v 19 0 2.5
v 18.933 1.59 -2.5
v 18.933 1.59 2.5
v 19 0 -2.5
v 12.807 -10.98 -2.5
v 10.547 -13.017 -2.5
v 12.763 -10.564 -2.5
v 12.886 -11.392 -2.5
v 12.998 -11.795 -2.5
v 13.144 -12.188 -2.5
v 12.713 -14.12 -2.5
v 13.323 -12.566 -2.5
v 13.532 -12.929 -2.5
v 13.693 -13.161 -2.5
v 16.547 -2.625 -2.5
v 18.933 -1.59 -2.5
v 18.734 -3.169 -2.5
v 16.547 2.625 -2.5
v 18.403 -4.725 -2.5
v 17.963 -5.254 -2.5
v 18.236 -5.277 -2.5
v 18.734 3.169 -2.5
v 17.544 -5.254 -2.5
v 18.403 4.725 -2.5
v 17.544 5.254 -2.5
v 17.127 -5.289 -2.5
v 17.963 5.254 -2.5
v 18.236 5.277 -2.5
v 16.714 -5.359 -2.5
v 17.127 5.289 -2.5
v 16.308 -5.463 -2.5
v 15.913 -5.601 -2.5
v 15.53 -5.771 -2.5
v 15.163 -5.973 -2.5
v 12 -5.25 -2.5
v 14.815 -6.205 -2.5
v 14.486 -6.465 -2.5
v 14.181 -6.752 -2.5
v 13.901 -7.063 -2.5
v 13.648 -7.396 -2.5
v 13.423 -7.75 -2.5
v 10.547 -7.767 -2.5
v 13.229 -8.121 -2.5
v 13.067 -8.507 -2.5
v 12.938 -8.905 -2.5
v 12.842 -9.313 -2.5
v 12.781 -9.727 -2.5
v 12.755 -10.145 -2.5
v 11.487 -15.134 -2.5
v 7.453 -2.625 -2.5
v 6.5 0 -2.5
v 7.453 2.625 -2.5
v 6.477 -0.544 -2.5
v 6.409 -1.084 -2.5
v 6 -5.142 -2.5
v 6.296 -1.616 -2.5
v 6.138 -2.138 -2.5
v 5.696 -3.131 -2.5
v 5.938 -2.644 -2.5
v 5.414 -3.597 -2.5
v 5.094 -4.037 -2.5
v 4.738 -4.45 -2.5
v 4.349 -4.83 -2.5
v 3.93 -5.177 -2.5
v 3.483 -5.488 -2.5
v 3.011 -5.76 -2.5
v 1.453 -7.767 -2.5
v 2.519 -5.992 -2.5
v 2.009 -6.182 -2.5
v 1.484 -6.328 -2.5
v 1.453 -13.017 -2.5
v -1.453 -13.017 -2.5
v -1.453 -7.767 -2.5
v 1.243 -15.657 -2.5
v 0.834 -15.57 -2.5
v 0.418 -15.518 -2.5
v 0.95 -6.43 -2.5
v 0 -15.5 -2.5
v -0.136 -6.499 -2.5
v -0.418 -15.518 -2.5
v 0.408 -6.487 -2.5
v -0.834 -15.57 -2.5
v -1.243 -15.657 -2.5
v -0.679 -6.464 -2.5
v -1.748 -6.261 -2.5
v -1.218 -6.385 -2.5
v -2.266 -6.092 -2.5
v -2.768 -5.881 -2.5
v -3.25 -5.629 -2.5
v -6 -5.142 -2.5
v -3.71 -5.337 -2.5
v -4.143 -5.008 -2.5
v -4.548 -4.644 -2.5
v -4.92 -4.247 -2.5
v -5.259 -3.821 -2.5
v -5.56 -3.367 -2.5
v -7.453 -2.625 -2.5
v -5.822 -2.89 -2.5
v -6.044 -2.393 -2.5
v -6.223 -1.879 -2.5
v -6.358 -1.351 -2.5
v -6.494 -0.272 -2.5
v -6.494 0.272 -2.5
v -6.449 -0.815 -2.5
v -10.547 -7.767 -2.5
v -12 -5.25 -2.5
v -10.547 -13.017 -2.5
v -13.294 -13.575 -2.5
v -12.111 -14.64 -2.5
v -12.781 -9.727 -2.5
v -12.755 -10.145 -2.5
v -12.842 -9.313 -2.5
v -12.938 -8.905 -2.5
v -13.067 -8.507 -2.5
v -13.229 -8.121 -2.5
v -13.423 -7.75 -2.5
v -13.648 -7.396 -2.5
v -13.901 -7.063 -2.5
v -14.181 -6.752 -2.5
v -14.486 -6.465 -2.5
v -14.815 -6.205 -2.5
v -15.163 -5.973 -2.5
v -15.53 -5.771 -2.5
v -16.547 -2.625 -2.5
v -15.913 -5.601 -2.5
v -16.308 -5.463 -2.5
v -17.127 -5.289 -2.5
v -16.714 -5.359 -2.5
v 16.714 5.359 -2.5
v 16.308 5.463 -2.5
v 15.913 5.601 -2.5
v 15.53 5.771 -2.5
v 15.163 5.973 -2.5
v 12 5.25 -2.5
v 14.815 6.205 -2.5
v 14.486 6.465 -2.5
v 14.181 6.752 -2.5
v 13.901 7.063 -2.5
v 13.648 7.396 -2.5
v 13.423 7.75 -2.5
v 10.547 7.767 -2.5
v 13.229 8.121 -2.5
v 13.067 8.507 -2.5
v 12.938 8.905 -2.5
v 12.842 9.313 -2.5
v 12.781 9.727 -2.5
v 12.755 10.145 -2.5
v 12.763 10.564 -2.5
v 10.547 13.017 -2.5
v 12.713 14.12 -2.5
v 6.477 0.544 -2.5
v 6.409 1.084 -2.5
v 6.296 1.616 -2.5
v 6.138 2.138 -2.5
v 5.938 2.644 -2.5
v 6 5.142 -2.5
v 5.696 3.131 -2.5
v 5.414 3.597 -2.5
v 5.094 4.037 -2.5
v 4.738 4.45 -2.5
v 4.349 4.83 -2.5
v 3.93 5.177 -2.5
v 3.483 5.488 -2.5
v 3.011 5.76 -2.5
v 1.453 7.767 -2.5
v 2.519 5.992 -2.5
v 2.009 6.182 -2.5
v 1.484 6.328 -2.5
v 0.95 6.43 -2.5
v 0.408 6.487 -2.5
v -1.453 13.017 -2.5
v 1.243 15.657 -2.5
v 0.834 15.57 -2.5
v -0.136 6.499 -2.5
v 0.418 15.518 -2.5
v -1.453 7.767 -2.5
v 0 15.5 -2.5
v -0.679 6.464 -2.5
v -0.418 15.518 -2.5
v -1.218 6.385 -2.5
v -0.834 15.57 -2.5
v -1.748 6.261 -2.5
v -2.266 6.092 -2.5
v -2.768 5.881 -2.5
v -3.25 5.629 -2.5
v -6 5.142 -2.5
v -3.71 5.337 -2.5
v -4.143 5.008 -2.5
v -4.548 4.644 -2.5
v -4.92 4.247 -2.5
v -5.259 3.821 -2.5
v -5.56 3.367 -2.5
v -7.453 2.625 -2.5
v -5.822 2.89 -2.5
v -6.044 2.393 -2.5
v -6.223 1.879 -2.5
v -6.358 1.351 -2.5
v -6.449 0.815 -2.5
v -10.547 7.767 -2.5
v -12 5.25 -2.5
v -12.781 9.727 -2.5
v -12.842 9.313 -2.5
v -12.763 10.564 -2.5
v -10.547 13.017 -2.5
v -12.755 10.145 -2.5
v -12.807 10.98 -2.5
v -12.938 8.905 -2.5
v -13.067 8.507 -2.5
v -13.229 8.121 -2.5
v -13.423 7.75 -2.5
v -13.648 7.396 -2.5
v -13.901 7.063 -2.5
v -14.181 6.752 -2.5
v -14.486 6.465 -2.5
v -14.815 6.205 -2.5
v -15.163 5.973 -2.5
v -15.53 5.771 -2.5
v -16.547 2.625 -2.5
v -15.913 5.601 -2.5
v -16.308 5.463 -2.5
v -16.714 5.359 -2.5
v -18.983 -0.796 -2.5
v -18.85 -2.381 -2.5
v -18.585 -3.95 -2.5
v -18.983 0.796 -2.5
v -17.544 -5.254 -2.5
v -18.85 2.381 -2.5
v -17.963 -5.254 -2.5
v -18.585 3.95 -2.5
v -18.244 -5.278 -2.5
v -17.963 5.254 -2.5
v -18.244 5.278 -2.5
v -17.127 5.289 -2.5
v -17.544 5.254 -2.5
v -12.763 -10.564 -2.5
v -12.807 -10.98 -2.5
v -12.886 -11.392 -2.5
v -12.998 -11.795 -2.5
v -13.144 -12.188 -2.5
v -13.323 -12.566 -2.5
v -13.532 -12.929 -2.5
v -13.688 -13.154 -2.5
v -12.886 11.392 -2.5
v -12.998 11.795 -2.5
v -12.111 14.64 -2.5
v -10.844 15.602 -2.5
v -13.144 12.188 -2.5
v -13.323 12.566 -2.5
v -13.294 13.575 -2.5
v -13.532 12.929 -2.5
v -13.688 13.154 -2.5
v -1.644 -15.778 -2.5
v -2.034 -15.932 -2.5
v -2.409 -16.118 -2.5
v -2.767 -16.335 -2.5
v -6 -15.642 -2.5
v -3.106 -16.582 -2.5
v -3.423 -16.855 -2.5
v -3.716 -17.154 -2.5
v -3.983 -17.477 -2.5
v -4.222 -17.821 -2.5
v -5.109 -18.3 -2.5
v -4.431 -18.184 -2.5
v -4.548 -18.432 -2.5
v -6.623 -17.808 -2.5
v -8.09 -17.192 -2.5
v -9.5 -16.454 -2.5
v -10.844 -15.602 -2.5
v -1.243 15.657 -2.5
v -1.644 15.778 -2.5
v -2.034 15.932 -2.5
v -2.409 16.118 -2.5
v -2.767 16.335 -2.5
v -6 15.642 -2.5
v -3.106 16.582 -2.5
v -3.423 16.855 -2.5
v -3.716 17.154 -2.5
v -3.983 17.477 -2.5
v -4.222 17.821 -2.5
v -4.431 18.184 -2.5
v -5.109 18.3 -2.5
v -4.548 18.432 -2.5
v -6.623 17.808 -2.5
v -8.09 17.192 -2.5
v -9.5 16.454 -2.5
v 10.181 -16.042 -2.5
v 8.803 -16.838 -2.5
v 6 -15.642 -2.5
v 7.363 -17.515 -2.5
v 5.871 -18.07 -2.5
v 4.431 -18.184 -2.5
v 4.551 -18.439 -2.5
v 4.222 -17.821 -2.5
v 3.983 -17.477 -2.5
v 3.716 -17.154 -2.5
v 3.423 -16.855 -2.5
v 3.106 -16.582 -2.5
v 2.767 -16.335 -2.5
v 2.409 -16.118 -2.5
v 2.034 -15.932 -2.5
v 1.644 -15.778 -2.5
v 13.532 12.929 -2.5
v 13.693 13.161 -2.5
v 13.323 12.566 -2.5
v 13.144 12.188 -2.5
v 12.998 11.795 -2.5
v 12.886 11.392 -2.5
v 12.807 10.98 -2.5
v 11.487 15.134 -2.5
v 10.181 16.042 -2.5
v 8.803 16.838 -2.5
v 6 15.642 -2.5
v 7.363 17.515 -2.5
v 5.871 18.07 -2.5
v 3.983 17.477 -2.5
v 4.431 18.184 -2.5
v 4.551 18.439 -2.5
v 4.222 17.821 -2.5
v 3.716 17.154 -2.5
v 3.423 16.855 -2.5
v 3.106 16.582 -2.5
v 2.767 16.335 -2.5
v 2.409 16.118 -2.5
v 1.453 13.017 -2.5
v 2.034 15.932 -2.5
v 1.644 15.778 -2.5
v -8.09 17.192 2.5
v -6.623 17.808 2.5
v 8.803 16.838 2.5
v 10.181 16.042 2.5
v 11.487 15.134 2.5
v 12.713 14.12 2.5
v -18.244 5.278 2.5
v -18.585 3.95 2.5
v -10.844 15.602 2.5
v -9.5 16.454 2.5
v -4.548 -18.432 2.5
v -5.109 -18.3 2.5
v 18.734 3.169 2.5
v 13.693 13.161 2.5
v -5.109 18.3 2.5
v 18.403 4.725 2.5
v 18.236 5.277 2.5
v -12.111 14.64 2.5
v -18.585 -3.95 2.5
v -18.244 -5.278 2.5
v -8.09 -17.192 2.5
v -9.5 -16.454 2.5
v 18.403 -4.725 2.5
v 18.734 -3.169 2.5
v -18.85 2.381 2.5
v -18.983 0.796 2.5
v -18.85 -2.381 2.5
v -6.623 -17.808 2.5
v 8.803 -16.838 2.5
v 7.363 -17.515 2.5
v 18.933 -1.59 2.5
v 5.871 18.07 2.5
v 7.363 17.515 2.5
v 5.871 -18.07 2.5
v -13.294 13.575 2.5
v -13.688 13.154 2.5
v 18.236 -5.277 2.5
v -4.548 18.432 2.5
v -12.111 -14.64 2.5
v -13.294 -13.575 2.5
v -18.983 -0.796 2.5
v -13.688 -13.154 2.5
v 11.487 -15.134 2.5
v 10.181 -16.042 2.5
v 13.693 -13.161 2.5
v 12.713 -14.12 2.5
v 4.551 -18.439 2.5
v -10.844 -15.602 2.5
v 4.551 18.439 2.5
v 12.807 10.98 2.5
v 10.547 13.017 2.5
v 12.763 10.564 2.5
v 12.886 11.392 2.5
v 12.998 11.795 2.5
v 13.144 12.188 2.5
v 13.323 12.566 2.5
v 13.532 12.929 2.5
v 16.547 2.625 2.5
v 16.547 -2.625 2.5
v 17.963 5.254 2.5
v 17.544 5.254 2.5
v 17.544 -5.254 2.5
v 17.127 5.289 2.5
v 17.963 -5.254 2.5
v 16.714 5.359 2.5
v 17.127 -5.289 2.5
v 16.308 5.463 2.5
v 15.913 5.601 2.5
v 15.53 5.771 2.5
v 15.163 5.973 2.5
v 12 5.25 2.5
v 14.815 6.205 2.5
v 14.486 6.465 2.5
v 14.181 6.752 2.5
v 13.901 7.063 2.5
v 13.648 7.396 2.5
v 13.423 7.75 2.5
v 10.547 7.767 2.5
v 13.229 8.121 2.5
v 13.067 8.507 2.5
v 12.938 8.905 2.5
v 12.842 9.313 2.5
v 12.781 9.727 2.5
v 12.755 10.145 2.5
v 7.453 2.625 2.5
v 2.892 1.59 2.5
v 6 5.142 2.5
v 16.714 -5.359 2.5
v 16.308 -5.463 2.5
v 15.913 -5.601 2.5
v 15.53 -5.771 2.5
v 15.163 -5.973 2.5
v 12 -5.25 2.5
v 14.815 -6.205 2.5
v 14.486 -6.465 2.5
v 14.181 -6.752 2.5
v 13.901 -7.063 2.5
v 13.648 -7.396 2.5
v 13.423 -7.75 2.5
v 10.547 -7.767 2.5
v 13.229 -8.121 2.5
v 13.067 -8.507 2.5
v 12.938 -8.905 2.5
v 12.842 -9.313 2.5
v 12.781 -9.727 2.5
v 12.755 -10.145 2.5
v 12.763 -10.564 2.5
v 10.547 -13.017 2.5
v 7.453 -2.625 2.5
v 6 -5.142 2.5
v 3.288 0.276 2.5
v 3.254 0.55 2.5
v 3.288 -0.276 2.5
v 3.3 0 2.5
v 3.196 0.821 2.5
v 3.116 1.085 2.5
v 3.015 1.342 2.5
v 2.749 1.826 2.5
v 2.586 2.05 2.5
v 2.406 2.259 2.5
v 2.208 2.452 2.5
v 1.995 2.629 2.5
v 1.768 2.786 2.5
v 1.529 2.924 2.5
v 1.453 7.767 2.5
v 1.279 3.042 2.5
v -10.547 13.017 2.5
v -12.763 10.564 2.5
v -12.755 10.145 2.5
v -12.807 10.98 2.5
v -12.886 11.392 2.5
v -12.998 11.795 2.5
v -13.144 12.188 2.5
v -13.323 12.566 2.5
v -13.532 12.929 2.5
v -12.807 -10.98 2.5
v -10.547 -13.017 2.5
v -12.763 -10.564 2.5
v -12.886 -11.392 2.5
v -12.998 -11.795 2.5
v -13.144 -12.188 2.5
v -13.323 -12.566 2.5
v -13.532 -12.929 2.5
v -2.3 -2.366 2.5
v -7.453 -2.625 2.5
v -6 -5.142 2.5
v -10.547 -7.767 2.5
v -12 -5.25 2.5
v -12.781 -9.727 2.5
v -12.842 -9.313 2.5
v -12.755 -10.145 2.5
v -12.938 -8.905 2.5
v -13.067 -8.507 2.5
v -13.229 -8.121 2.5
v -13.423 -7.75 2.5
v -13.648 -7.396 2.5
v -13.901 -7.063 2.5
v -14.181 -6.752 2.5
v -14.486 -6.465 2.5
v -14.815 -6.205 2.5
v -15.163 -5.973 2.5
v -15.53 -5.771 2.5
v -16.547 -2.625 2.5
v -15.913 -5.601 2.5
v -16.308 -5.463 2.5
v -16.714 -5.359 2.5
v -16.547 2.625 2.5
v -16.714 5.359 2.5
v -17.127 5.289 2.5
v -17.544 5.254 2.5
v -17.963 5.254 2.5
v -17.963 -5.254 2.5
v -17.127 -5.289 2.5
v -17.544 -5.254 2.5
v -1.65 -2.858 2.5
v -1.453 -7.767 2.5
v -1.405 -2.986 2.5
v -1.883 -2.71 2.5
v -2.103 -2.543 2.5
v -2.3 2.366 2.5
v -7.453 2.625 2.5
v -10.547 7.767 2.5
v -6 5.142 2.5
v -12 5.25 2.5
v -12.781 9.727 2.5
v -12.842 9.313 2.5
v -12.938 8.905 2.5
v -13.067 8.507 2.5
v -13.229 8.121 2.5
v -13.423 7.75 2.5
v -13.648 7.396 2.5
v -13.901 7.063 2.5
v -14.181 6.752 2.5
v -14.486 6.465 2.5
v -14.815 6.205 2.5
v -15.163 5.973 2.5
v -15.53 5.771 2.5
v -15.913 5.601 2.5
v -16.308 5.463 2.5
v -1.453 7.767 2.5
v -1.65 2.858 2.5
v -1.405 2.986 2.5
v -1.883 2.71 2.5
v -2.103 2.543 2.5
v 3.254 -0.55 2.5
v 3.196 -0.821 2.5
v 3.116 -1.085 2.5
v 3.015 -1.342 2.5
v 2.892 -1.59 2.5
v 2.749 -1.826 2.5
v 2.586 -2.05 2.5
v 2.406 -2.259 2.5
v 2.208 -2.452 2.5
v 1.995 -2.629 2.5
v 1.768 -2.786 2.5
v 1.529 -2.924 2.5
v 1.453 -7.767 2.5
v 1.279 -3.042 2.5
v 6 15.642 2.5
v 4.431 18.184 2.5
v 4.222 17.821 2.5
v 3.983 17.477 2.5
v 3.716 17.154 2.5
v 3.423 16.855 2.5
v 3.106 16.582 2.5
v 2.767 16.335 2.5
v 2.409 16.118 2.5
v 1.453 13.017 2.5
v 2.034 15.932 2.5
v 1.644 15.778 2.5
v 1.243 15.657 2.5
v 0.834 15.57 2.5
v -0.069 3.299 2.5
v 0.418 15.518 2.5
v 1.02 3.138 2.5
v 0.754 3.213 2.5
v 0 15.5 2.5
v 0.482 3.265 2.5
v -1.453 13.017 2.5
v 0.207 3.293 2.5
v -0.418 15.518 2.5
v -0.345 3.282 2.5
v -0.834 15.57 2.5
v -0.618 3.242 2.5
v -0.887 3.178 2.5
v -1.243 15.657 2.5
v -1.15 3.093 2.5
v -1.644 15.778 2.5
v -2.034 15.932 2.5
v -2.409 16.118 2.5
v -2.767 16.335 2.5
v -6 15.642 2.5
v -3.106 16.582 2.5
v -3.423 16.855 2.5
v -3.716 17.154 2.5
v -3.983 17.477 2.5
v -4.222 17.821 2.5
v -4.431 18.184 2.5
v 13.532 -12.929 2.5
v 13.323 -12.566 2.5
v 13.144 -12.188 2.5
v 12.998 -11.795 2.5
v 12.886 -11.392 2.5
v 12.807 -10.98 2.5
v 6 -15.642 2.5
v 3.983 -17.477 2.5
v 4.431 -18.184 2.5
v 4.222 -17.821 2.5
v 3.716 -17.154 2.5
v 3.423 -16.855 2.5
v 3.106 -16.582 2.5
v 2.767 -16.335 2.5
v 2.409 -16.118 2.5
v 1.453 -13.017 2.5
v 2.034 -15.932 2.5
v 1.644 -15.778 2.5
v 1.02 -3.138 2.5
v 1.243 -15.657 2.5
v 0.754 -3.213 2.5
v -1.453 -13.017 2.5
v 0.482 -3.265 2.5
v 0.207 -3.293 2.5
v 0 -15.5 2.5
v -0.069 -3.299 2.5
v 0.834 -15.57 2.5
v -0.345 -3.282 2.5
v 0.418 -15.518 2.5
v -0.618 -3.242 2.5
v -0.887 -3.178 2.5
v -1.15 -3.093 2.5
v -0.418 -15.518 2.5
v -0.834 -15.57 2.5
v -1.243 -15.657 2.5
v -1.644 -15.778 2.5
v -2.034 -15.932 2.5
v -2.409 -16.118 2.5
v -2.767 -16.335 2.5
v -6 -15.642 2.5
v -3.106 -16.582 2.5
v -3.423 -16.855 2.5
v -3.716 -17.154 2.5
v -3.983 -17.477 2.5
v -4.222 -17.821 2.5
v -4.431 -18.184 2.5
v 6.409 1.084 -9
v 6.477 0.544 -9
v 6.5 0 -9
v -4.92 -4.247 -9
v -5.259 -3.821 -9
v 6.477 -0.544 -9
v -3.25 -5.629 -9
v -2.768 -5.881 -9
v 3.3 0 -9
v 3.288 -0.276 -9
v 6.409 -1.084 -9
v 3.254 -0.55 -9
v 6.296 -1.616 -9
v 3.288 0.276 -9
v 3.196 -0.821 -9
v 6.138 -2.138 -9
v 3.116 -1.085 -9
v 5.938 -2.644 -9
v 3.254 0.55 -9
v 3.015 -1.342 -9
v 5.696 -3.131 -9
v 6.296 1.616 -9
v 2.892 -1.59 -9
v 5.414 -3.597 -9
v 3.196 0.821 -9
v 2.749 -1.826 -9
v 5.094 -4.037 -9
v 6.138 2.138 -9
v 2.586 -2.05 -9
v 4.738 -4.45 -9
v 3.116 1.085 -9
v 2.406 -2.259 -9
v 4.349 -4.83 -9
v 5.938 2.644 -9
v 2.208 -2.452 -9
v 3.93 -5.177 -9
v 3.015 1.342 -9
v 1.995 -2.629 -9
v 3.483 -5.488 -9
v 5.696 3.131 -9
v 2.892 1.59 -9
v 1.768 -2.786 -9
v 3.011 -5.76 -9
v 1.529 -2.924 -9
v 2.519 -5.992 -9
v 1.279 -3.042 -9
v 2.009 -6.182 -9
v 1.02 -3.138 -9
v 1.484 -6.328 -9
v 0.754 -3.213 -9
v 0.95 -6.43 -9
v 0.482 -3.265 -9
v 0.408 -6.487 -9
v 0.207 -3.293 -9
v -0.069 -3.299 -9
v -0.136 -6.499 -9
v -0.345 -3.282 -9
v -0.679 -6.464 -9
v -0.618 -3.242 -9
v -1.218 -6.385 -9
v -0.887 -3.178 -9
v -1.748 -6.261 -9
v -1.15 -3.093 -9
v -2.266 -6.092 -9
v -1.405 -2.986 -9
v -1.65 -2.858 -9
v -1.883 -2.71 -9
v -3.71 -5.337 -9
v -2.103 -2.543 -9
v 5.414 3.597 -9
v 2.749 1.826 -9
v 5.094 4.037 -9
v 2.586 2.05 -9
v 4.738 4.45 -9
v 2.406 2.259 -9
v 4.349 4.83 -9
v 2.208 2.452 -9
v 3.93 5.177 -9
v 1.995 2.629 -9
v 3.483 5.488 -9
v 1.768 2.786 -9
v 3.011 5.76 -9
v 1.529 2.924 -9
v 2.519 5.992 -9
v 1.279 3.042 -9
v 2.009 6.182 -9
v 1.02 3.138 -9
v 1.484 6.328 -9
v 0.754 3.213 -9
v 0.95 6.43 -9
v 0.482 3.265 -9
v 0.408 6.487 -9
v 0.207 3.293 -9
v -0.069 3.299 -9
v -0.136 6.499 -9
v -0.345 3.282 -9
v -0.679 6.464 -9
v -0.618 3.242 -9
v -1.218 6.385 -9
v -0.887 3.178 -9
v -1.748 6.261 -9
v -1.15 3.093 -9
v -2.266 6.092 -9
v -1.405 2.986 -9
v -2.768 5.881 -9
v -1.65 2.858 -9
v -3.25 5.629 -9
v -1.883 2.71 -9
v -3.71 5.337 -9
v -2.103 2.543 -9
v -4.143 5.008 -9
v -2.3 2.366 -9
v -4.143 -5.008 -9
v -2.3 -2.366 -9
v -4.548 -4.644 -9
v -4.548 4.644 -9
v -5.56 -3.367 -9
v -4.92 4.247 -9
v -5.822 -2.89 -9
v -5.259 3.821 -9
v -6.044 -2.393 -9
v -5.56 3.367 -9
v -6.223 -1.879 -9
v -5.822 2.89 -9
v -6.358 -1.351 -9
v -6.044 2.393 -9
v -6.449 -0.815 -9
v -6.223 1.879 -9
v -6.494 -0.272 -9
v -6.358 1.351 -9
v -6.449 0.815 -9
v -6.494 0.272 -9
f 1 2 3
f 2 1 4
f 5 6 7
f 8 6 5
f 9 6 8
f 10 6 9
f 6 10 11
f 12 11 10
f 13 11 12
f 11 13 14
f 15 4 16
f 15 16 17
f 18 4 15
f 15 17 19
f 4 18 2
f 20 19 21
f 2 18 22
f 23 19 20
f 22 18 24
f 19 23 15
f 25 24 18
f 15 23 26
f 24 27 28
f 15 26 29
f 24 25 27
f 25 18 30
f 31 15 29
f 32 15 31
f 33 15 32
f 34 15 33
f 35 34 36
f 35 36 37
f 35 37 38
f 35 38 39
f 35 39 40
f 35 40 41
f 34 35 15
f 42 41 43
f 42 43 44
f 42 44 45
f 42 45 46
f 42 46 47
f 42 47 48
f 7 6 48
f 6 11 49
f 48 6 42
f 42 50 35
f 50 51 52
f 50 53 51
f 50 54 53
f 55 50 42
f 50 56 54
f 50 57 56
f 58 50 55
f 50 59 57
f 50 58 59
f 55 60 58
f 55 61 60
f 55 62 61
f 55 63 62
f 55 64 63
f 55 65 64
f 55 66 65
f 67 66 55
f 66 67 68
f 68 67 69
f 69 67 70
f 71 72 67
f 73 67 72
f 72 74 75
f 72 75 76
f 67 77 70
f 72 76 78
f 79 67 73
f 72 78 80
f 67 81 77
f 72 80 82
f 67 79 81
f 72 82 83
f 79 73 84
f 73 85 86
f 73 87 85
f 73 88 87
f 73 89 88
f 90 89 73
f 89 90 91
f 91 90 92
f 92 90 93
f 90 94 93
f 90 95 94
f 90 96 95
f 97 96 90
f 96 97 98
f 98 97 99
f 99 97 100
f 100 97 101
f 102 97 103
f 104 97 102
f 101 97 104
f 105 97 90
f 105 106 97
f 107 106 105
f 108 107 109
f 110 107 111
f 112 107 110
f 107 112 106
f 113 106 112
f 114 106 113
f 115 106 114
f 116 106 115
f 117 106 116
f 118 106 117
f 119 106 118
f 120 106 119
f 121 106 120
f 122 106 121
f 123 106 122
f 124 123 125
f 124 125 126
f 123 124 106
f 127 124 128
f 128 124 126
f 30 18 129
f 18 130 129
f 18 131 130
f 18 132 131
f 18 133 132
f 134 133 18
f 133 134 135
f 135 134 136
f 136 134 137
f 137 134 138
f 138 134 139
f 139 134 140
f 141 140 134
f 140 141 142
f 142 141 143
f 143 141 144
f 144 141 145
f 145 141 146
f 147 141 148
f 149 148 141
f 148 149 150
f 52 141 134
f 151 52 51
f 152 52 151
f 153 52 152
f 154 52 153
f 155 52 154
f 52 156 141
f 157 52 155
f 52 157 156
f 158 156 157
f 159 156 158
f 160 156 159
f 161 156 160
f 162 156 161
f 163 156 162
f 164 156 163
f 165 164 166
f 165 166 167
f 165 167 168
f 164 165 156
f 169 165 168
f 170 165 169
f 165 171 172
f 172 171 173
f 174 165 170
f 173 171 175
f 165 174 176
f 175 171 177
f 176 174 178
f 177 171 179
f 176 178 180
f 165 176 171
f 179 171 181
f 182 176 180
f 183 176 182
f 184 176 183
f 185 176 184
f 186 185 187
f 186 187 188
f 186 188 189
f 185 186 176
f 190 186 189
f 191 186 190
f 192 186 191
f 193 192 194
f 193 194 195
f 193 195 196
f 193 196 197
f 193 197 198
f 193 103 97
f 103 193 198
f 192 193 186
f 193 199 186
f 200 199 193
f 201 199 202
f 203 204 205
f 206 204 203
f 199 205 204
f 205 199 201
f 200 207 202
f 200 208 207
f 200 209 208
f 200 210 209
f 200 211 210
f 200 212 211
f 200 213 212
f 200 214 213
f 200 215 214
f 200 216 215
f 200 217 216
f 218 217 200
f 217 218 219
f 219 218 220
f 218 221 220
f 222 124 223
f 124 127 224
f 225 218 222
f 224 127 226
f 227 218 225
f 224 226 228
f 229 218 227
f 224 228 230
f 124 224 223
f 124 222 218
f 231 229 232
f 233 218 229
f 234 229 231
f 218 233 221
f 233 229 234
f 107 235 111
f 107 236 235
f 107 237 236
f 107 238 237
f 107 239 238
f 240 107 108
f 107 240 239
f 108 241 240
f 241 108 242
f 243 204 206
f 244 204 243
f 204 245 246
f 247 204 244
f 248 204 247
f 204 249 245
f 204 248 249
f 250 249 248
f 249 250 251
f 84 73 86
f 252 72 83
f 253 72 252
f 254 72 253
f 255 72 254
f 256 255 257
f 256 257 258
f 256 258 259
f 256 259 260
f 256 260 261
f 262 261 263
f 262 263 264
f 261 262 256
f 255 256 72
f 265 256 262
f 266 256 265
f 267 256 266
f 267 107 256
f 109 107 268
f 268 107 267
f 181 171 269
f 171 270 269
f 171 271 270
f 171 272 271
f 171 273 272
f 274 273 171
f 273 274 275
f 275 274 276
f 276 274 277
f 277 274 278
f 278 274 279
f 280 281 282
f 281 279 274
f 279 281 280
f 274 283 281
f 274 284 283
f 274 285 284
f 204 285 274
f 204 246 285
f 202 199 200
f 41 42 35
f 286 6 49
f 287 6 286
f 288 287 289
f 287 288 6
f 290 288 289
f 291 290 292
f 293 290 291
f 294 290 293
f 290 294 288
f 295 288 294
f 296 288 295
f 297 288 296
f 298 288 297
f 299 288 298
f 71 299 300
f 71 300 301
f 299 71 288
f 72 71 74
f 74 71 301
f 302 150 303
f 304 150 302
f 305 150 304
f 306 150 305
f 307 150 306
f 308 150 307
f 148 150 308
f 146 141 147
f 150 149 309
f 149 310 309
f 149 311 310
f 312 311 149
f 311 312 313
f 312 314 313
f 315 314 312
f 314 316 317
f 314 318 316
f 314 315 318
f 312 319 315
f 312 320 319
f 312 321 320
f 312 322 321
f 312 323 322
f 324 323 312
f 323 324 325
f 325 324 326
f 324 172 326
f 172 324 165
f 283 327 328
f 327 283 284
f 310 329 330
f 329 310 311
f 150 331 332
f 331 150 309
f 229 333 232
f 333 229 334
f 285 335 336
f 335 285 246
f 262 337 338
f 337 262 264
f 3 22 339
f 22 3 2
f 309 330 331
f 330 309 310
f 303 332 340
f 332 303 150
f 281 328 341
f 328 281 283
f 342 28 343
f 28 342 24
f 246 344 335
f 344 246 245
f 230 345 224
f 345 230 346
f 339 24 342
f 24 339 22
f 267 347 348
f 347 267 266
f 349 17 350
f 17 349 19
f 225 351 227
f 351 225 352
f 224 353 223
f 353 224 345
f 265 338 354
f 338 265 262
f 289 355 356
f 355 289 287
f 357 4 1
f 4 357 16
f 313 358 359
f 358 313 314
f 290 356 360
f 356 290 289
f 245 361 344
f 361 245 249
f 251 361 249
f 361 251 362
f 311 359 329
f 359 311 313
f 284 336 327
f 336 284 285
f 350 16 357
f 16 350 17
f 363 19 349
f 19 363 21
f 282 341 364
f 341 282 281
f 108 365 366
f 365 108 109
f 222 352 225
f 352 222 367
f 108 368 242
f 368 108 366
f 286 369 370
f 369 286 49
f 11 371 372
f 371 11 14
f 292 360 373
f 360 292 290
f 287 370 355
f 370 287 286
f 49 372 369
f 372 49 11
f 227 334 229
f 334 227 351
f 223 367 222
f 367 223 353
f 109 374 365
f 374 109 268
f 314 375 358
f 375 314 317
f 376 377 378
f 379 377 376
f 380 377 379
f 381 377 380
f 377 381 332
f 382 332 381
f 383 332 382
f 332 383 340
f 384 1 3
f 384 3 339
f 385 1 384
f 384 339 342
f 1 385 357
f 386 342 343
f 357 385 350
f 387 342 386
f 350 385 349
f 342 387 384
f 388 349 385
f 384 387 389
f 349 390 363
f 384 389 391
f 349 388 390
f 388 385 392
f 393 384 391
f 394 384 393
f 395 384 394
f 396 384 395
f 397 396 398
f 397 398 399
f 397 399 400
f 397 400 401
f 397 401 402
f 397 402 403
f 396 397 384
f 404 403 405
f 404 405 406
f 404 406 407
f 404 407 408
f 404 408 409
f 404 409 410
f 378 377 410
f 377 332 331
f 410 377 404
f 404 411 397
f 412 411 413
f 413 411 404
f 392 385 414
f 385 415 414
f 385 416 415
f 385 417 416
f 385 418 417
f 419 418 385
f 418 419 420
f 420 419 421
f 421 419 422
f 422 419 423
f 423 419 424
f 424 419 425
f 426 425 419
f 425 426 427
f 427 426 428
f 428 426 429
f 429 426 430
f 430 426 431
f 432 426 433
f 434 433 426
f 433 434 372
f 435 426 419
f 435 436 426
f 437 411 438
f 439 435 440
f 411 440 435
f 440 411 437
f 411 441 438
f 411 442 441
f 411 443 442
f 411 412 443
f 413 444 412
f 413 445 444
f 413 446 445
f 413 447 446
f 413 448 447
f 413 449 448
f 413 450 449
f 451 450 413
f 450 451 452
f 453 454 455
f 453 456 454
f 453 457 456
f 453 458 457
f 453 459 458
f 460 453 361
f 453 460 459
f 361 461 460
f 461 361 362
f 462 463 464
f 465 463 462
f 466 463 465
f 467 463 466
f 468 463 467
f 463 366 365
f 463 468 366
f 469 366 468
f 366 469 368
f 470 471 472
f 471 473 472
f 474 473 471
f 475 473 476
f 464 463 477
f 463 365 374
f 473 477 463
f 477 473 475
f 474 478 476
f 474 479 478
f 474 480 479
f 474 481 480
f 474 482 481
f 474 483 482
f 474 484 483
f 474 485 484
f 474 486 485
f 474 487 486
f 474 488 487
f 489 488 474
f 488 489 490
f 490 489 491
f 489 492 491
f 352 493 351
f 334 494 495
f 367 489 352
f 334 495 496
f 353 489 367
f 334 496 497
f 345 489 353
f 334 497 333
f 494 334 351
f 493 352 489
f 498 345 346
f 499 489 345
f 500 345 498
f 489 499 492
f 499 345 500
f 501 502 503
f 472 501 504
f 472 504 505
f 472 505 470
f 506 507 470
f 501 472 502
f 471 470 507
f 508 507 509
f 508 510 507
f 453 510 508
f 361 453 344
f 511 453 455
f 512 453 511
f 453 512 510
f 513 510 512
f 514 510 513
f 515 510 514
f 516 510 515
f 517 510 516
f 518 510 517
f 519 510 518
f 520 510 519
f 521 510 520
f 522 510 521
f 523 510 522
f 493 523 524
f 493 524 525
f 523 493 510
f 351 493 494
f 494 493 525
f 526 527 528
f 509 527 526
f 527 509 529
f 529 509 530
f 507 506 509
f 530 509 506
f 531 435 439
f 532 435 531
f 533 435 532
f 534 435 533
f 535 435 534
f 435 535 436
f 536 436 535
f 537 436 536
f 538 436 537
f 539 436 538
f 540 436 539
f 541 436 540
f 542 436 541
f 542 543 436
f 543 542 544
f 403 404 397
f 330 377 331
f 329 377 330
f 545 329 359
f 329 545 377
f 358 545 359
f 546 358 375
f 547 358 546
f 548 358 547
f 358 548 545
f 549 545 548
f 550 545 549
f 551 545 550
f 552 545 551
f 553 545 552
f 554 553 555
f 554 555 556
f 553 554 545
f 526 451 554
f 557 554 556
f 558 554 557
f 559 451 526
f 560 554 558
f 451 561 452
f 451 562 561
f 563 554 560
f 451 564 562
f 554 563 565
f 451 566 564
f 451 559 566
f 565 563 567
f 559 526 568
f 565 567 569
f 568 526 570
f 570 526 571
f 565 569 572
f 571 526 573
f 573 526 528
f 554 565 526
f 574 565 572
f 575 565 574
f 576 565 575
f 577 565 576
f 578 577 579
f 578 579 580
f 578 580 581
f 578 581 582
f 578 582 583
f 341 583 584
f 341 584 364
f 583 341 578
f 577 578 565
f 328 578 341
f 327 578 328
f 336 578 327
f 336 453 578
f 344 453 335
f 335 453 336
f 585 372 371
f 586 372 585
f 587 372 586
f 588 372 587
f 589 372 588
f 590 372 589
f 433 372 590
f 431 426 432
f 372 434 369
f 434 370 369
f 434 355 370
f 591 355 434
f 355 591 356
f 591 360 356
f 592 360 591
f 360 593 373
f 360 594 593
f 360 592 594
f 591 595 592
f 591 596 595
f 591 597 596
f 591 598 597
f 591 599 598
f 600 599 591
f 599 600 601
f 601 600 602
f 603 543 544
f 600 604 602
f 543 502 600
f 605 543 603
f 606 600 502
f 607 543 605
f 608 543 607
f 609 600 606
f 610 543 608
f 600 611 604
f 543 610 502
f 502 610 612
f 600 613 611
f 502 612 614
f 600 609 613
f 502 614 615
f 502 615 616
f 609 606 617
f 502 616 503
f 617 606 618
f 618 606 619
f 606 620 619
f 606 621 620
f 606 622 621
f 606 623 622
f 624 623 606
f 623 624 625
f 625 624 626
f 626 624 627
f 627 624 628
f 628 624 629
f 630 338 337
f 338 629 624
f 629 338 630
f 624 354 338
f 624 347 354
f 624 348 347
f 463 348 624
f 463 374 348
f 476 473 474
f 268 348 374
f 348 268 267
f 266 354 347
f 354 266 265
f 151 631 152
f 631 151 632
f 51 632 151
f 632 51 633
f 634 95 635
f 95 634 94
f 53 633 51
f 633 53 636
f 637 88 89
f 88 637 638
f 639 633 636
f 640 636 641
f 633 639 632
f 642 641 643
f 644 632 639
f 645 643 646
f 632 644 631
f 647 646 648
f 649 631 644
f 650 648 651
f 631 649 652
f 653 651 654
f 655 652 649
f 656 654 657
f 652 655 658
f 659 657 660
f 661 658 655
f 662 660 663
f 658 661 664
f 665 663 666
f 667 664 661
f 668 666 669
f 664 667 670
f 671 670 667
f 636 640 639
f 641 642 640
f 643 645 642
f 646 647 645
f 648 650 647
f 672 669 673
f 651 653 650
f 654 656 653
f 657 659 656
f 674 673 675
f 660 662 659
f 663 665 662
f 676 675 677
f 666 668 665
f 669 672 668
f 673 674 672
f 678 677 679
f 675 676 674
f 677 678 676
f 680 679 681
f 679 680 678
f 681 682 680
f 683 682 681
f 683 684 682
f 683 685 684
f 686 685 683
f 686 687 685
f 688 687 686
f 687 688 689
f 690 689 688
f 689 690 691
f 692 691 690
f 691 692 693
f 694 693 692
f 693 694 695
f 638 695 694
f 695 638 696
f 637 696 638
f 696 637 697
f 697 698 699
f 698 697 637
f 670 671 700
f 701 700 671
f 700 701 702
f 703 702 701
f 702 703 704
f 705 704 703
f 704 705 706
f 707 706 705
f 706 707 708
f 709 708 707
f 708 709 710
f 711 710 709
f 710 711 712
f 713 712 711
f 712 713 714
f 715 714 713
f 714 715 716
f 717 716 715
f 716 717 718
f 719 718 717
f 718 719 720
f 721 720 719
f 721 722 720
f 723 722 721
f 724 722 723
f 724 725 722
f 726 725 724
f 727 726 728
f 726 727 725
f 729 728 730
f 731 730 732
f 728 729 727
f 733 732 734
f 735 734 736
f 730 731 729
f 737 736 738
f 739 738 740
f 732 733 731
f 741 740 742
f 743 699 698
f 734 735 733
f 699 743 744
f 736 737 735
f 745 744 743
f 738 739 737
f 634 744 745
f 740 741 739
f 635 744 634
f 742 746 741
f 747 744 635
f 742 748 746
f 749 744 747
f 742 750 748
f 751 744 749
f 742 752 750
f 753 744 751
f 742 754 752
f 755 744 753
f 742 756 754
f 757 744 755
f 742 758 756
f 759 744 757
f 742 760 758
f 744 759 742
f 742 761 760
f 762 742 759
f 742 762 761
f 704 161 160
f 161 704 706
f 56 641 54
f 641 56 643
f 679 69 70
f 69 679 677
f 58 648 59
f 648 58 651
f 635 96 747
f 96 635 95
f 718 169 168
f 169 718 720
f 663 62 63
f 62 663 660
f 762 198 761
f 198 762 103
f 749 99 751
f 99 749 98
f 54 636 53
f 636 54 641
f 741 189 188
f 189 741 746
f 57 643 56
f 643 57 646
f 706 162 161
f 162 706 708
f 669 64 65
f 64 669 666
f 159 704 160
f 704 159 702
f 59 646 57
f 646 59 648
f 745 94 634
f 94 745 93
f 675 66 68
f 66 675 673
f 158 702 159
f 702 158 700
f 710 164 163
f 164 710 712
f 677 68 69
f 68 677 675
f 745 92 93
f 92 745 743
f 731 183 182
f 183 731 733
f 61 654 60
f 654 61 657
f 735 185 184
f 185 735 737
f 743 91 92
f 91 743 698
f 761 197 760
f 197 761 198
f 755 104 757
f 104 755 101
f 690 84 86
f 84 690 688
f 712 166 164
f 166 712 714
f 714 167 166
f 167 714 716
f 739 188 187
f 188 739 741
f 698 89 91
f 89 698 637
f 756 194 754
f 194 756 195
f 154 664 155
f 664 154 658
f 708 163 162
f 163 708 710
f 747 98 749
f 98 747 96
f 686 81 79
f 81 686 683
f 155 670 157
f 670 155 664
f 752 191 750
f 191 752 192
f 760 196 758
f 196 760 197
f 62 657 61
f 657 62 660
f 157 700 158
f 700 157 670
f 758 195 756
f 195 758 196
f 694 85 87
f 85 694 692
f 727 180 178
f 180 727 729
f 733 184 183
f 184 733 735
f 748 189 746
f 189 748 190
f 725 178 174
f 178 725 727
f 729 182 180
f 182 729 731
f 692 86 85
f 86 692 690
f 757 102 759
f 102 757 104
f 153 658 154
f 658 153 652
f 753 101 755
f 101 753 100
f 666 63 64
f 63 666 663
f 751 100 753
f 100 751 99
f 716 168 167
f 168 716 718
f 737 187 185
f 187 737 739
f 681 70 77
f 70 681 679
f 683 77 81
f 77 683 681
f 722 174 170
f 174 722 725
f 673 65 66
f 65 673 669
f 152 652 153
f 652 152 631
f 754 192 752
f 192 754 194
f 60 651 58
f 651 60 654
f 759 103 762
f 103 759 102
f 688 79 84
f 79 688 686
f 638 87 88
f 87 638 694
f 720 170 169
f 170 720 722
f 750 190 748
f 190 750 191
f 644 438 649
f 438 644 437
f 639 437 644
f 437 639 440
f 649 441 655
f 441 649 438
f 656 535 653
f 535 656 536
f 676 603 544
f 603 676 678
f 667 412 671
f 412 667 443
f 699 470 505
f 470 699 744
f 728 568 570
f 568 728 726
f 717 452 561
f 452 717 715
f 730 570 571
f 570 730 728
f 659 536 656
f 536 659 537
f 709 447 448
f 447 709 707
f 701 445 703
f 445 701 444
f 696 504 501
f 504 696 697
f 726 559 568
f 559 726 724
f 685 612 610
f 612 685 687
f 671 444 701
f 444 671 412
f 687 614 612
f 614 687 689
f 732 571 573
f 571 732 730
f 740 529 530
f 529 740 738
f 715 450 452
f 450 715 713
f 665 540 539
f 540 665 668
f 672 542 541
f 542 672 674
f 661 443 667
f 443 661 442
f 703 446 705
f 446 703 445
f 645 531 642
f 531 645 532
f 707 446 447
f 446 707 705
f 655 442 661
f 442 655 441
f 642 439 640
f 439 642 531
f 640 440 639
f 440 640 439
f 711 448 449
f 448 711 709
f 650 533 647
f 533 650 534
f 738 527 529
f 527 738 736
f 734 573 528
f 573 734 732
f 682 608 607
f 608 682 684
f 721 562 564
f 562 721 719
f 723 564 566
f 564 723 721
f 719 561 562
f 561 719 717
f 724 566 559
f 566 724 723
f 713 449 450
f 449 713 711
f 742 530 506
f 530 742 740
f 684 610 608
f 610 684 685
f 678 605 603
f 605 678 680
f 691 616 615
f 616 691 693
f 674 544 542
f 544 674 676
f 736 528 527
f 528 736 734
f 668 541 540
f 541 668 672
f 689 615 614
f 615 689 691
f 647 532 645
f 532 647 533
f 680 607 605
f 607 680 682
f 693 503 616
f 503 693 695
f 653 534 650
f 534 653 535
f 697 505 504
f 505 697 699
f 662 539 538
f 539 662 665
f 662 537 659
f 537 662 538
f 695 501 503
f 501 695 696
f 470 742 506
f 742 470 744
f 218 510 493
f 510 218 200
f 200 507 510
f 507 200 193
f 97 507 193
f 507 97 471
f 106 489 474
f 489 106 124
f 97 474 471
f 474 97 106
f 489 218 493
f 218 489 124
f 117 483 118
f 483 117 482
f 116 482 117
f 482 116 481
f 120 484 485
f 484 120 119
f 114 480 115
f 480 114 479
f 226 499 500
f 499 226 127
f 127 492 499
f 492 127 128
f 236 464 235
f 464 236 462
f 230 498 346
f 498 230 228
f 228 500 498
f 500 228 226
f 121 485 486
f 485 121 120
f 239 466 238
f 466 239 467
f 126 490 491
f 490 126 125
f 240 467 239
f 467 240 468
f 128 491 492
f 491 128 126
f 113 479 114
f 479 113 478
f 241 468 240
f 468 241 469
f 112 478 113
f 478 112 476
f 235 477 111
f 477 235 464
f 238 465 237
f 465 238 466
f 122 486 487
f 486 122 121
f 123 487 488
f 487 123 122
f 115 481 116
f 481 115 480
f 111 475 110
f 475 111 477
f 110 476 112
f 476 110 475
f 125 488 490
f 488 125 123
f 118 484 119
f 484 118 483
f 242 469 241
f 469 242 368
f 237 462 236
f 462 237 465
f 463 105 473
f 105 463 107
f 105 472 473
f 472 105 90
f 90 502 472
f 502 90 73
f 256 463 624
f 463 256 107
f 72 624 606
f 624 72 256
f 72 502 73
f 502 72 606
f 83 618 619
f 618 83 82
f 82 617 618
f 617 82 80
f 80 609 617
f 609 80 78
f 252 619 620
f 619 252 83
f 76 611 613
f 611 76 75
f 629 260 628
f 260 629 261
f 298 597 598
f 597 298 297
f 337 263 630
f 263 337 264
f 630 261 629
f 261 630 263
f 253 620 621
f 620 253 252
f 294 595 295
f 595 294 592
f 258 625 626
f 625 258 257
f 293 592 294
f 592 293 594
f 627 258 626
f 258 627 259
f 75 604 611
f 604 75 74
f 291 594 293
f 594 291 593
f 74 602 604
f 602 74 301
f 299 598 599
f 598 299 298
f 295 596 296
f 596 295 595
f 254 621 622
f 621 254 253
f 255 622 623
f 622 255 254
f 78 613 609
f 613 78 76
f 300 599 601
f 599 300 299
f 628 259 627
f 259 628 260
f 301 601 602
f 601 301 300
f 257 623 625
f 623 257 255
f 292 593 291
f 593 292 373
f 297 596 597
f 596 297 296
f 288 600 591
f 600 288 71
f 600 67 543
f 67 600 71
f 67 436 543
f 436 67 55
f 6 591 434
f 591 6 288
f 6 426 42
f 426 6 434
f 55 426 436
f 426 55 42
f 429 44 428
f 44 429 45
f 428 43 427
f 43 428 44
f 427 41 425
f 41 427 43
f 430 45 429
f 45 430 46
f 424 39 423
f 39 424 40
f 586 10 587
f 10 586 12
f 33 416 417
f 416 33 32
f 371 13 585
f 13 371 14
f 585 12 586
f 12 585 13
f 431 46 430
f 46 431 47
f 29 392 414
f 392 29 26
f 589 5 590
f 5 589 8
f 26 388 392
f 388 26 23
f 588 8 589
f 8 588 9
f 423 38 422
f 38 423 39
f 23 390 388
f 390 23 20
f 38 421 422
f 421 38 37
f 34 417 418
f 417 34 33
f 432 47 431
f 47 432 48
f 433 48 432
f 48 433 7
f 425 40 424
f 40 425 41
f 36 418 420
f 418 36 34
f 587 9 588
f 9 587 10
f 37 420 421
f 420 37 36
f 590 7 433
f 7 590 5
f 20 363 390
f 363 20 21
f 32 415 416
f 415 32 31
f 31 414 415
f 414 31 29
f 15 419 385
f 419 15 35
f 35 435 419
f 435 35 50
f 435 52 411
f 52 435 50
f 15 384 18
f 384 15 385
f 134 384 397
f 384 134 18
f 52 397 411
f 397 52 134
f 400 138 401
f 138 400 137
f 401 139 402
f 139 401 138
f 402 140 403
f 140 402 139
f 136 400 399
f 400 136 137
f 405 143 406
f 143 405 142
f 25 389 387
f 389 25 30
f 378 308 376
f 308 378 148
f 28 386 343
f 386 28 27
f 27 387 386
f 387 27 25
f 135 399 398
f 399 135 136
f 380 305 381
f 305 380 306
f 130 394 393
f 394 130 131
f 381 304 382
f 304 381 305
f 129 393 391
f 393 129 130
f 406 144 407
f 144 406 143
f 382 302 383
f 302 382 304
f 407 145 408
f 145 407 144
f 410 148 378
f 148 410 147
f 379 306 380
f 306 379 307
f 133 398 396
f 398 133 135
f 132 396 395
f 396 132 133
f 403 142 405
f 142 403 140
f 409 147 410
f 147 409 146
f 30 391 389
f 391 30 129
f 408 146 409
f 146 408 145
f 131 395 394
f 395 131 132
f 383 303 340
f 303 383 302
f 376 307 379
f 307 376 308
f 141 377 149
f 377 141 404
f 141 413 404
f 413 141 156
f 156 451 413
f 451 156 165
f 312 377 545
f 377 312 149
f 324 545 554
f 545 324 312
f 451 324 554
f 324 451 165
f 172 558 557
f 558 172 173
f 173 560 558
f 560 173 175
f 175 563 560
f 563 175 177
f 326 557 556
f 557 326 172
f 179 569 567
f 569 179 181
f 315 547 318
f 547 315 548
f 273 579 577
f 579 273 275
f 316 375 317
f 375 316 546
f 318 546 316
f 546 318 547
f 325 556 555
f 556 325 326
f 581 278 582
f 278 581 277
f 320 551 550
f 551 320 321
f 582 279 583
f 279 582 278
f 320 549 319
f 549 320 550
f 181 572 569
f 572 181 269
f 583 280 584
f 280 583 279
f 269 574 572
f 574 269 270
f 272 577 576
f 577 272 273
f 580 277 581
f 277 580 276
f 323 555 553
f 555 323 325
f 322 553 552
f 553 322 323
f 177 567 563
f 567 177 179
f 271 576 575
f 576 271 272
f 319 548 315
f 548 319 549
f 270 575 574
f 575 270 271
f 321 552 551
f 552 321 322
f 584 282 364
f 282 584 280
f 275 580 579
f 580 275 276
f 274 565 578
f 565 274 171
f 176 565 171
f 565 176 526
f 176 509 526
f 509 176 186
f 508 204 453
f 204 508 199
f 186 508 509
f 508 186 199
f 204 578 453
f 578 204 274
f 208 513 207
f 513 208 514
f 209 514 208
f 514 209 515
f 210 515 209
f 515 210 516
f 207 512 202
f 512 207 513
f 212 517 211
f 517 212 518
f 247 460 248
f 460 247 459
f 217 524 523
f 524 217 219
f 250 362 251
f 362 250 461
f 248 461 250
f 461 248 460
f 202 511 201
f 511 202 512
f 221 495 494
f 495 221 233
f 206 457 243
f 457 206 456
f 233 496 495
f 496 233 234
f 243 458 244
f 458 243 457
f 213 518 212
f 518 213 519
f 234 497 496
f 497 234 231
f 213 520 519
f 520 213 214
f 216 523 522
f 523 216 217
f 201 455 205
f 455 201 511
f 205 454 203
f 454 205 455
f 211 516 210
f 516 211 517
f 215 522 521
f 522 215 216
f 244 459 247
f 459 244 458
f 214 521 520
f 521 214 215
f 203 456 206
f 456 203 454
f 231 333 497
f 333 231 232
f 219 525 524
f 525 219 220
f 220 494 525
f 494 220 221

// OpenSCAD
$fn = 75;

module valve() {
	difference() {
		cylinder(h=20, d=6.6, center=true);
		translate([-5 - 3.3 + 1, 0 ,0])
			cube([10, 10, 21], center=true);
	}
	for (a=[0:60:350]) {
		rotate([0, 0, a]) {
			translate([-12, 0, 0])
				rotate([0, 0, 30])
					cylinder(h=20, d=10.5, center=true, $fn=6);
			rotate([0, 0, 30])
				translate([-20.5, 0, 0])
					cylinder(h=20, d=10, center=true);

		}
	}
}

difference(){
	union() {
		cylinder(d=38, h=5,  center=true);
		translate([0, 0, -5])
			cylinder(d=13, h=8,  center=true);
	}
	valve();
}
